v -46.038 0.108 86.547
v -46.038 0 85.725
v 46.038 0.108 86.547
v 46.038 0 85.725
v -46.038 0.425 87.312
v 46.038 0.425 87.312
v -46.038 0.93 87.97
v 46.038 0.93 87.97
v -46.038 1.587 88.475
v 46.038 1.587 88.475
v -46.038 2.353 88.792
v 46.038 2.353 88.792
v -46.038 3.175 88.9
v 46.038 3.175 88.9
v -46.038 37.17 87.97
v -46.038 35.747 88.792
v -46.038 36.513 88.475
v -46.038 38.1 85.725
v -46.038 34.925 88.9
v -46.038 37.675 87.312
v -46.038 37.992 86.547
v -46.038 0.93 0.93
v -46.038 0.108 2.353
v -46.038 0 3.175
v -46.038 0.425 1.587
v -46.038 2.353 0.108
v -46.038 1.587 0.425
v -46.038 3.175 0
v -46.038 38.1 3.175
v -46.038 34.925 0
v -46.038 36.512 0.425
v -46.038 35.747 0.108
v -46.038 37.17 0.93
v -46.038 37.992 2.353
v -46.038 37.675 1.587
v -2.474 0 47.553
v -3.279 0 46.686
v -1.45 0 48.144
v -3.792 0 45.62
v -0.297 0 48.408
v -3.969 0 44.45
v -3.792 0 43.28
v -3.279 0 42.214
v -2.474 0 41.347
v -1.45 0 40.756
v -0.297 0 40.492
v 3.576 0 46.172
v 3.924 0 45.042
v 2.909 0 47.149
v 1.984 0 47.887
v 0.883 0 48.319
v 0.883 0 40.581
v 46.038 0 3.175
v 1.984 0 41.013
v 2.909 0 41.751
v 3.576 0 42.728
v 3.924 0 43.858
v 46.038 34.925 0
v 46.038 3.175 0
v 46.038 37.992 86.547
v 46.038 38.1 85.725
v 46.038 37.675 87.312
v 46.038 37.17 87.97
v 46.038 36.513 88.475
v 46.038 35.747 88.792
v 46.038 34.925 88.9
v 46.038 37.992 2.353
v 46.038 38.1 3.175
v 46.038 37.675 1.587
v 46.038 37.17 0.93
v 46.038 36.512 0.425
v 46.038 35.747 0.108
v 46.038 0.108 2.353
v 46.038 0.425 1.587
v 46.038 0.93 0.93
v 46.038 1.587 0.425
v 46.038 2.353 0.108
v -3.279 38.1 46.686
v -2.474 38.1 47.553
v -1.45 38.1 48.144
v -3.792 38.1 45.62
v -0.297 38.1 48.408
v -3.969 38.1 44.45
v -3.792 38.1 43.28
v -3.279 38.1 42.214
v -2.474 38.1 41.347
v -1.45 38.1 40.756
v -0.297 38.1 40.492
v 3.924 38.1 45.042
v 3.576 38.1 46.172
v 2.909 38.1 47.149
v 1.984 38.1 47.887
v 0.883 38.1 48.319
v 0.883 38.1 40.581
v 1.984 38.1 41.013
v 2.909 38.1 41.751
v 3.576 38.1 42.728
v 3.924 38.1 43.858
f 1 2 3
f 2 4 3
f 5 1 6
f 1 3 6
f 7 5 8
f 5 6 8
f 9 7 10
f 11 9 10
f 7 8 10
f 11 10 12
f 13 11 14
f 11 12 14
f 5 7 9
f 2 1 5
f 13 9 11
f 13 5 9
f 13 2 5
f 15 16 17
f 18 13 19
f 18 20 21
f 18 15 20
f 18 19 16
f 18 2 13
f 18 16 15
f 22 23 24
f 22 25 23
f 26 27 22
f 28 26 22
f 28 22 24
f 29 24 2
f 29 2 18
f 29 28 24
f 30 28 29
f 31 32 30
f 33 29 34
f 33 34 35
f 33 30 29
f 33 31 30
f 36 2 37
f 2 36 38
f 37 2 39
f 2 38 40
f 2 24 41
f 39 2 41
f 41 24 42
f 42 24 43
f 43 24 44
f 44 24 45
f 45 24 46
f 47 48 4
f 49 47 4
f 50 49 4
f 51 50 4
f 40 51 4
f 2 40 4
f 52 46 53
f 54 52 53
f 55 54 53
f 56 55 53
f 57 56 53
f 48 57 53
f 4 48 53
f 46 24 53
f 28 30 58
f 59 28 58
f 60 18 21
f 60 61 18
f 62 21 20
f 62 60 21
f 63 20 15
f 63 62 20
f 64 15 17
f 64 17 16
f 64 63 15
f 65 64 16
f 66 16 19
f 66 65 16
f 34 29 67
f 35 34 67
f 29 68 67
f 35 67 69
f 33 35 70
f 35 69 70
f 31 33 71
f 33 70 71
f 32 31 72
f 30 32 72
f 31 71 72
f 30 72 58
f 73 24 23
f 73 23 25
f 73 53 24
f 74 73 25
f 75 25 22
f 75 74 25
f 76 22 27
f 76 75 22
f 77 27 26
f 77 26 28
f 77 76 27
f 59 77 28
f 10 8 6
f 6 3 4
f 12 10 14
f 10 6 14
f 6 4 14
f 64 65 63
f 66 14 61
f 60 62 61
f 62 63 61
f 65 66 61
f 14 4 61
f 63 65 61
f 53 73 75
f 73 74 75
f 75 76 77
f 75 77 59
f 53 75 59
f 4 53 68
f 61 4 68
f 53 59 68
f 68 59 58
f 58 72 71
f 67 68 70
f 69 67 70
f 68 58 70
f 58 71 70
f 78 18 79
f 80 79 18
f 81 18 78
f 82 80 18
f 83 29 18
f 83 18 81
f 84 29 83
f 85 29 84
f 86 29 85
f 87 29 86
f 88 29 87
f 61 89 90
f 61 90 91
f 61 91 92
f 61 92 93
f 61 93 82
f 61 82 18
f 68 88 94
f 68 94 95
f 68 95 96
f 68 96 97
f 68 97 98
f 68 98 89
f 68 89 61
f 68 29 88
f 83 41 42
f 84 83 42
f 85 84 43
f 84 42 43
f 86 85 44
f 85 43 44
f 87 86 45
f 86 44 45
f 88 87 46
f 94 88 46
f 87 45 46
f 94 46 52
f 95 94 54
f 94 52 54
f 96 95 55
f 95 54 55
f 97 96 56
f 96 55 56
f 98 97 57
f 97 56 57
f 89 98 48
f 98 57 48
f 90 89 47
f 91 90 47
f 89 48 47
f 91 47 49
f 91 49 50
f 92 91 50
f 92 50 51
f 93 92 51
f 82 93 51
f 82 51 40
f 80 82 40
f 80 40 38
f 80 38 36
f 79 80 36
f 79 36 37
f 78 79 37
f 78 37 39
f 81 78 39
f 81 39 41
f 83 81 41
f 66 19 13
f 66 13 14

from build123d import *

# Parameters (mm, degrees)
SKETCH1_W                      = 92.075
SKETCH1_H                      = 38.1
BOSS_EXTRUDE1_DEPTH            = 88.9
FILLET1_R                      = 3.175
F_5_16_0_3125_DIAMETER_HOLE1_D = 7.9375


with BuildPart() as part:
    # Sketch1 → Boss-Extrude1 (new body)
    with BuildSketch(Plane.XY):
        with Locations((0, 19.05)):
            Rectangle(SKETCH1_W, SKETCH1_H)
    extrude(amount=BOSS_EXTRUDE1_DEPTH)

    # Fillet1
    fillet1_edges = [part.edges().sort_by_distance(p)[0] for p in [
        (0, 38.1, 88.9),
        (0, 38.1, 0),
        (0, 0, 0),
        (0, 0, 88.9),
    ]]
    fillet(fillet1_edges, radius=FILLET1_R)

    # 5/16 (0.3125) Diameter Hole1 (through all)
    with Locations(Plane(origin=(0, 38.1, 0), x_dir=(1, 0, 0), z_dir=(0, 1, 0))):
        with Locations((0, -44.45)):
            Hole(F_5_16_0_3125_DIAMETER_HOLE1_D / 2)


solid = part.part
